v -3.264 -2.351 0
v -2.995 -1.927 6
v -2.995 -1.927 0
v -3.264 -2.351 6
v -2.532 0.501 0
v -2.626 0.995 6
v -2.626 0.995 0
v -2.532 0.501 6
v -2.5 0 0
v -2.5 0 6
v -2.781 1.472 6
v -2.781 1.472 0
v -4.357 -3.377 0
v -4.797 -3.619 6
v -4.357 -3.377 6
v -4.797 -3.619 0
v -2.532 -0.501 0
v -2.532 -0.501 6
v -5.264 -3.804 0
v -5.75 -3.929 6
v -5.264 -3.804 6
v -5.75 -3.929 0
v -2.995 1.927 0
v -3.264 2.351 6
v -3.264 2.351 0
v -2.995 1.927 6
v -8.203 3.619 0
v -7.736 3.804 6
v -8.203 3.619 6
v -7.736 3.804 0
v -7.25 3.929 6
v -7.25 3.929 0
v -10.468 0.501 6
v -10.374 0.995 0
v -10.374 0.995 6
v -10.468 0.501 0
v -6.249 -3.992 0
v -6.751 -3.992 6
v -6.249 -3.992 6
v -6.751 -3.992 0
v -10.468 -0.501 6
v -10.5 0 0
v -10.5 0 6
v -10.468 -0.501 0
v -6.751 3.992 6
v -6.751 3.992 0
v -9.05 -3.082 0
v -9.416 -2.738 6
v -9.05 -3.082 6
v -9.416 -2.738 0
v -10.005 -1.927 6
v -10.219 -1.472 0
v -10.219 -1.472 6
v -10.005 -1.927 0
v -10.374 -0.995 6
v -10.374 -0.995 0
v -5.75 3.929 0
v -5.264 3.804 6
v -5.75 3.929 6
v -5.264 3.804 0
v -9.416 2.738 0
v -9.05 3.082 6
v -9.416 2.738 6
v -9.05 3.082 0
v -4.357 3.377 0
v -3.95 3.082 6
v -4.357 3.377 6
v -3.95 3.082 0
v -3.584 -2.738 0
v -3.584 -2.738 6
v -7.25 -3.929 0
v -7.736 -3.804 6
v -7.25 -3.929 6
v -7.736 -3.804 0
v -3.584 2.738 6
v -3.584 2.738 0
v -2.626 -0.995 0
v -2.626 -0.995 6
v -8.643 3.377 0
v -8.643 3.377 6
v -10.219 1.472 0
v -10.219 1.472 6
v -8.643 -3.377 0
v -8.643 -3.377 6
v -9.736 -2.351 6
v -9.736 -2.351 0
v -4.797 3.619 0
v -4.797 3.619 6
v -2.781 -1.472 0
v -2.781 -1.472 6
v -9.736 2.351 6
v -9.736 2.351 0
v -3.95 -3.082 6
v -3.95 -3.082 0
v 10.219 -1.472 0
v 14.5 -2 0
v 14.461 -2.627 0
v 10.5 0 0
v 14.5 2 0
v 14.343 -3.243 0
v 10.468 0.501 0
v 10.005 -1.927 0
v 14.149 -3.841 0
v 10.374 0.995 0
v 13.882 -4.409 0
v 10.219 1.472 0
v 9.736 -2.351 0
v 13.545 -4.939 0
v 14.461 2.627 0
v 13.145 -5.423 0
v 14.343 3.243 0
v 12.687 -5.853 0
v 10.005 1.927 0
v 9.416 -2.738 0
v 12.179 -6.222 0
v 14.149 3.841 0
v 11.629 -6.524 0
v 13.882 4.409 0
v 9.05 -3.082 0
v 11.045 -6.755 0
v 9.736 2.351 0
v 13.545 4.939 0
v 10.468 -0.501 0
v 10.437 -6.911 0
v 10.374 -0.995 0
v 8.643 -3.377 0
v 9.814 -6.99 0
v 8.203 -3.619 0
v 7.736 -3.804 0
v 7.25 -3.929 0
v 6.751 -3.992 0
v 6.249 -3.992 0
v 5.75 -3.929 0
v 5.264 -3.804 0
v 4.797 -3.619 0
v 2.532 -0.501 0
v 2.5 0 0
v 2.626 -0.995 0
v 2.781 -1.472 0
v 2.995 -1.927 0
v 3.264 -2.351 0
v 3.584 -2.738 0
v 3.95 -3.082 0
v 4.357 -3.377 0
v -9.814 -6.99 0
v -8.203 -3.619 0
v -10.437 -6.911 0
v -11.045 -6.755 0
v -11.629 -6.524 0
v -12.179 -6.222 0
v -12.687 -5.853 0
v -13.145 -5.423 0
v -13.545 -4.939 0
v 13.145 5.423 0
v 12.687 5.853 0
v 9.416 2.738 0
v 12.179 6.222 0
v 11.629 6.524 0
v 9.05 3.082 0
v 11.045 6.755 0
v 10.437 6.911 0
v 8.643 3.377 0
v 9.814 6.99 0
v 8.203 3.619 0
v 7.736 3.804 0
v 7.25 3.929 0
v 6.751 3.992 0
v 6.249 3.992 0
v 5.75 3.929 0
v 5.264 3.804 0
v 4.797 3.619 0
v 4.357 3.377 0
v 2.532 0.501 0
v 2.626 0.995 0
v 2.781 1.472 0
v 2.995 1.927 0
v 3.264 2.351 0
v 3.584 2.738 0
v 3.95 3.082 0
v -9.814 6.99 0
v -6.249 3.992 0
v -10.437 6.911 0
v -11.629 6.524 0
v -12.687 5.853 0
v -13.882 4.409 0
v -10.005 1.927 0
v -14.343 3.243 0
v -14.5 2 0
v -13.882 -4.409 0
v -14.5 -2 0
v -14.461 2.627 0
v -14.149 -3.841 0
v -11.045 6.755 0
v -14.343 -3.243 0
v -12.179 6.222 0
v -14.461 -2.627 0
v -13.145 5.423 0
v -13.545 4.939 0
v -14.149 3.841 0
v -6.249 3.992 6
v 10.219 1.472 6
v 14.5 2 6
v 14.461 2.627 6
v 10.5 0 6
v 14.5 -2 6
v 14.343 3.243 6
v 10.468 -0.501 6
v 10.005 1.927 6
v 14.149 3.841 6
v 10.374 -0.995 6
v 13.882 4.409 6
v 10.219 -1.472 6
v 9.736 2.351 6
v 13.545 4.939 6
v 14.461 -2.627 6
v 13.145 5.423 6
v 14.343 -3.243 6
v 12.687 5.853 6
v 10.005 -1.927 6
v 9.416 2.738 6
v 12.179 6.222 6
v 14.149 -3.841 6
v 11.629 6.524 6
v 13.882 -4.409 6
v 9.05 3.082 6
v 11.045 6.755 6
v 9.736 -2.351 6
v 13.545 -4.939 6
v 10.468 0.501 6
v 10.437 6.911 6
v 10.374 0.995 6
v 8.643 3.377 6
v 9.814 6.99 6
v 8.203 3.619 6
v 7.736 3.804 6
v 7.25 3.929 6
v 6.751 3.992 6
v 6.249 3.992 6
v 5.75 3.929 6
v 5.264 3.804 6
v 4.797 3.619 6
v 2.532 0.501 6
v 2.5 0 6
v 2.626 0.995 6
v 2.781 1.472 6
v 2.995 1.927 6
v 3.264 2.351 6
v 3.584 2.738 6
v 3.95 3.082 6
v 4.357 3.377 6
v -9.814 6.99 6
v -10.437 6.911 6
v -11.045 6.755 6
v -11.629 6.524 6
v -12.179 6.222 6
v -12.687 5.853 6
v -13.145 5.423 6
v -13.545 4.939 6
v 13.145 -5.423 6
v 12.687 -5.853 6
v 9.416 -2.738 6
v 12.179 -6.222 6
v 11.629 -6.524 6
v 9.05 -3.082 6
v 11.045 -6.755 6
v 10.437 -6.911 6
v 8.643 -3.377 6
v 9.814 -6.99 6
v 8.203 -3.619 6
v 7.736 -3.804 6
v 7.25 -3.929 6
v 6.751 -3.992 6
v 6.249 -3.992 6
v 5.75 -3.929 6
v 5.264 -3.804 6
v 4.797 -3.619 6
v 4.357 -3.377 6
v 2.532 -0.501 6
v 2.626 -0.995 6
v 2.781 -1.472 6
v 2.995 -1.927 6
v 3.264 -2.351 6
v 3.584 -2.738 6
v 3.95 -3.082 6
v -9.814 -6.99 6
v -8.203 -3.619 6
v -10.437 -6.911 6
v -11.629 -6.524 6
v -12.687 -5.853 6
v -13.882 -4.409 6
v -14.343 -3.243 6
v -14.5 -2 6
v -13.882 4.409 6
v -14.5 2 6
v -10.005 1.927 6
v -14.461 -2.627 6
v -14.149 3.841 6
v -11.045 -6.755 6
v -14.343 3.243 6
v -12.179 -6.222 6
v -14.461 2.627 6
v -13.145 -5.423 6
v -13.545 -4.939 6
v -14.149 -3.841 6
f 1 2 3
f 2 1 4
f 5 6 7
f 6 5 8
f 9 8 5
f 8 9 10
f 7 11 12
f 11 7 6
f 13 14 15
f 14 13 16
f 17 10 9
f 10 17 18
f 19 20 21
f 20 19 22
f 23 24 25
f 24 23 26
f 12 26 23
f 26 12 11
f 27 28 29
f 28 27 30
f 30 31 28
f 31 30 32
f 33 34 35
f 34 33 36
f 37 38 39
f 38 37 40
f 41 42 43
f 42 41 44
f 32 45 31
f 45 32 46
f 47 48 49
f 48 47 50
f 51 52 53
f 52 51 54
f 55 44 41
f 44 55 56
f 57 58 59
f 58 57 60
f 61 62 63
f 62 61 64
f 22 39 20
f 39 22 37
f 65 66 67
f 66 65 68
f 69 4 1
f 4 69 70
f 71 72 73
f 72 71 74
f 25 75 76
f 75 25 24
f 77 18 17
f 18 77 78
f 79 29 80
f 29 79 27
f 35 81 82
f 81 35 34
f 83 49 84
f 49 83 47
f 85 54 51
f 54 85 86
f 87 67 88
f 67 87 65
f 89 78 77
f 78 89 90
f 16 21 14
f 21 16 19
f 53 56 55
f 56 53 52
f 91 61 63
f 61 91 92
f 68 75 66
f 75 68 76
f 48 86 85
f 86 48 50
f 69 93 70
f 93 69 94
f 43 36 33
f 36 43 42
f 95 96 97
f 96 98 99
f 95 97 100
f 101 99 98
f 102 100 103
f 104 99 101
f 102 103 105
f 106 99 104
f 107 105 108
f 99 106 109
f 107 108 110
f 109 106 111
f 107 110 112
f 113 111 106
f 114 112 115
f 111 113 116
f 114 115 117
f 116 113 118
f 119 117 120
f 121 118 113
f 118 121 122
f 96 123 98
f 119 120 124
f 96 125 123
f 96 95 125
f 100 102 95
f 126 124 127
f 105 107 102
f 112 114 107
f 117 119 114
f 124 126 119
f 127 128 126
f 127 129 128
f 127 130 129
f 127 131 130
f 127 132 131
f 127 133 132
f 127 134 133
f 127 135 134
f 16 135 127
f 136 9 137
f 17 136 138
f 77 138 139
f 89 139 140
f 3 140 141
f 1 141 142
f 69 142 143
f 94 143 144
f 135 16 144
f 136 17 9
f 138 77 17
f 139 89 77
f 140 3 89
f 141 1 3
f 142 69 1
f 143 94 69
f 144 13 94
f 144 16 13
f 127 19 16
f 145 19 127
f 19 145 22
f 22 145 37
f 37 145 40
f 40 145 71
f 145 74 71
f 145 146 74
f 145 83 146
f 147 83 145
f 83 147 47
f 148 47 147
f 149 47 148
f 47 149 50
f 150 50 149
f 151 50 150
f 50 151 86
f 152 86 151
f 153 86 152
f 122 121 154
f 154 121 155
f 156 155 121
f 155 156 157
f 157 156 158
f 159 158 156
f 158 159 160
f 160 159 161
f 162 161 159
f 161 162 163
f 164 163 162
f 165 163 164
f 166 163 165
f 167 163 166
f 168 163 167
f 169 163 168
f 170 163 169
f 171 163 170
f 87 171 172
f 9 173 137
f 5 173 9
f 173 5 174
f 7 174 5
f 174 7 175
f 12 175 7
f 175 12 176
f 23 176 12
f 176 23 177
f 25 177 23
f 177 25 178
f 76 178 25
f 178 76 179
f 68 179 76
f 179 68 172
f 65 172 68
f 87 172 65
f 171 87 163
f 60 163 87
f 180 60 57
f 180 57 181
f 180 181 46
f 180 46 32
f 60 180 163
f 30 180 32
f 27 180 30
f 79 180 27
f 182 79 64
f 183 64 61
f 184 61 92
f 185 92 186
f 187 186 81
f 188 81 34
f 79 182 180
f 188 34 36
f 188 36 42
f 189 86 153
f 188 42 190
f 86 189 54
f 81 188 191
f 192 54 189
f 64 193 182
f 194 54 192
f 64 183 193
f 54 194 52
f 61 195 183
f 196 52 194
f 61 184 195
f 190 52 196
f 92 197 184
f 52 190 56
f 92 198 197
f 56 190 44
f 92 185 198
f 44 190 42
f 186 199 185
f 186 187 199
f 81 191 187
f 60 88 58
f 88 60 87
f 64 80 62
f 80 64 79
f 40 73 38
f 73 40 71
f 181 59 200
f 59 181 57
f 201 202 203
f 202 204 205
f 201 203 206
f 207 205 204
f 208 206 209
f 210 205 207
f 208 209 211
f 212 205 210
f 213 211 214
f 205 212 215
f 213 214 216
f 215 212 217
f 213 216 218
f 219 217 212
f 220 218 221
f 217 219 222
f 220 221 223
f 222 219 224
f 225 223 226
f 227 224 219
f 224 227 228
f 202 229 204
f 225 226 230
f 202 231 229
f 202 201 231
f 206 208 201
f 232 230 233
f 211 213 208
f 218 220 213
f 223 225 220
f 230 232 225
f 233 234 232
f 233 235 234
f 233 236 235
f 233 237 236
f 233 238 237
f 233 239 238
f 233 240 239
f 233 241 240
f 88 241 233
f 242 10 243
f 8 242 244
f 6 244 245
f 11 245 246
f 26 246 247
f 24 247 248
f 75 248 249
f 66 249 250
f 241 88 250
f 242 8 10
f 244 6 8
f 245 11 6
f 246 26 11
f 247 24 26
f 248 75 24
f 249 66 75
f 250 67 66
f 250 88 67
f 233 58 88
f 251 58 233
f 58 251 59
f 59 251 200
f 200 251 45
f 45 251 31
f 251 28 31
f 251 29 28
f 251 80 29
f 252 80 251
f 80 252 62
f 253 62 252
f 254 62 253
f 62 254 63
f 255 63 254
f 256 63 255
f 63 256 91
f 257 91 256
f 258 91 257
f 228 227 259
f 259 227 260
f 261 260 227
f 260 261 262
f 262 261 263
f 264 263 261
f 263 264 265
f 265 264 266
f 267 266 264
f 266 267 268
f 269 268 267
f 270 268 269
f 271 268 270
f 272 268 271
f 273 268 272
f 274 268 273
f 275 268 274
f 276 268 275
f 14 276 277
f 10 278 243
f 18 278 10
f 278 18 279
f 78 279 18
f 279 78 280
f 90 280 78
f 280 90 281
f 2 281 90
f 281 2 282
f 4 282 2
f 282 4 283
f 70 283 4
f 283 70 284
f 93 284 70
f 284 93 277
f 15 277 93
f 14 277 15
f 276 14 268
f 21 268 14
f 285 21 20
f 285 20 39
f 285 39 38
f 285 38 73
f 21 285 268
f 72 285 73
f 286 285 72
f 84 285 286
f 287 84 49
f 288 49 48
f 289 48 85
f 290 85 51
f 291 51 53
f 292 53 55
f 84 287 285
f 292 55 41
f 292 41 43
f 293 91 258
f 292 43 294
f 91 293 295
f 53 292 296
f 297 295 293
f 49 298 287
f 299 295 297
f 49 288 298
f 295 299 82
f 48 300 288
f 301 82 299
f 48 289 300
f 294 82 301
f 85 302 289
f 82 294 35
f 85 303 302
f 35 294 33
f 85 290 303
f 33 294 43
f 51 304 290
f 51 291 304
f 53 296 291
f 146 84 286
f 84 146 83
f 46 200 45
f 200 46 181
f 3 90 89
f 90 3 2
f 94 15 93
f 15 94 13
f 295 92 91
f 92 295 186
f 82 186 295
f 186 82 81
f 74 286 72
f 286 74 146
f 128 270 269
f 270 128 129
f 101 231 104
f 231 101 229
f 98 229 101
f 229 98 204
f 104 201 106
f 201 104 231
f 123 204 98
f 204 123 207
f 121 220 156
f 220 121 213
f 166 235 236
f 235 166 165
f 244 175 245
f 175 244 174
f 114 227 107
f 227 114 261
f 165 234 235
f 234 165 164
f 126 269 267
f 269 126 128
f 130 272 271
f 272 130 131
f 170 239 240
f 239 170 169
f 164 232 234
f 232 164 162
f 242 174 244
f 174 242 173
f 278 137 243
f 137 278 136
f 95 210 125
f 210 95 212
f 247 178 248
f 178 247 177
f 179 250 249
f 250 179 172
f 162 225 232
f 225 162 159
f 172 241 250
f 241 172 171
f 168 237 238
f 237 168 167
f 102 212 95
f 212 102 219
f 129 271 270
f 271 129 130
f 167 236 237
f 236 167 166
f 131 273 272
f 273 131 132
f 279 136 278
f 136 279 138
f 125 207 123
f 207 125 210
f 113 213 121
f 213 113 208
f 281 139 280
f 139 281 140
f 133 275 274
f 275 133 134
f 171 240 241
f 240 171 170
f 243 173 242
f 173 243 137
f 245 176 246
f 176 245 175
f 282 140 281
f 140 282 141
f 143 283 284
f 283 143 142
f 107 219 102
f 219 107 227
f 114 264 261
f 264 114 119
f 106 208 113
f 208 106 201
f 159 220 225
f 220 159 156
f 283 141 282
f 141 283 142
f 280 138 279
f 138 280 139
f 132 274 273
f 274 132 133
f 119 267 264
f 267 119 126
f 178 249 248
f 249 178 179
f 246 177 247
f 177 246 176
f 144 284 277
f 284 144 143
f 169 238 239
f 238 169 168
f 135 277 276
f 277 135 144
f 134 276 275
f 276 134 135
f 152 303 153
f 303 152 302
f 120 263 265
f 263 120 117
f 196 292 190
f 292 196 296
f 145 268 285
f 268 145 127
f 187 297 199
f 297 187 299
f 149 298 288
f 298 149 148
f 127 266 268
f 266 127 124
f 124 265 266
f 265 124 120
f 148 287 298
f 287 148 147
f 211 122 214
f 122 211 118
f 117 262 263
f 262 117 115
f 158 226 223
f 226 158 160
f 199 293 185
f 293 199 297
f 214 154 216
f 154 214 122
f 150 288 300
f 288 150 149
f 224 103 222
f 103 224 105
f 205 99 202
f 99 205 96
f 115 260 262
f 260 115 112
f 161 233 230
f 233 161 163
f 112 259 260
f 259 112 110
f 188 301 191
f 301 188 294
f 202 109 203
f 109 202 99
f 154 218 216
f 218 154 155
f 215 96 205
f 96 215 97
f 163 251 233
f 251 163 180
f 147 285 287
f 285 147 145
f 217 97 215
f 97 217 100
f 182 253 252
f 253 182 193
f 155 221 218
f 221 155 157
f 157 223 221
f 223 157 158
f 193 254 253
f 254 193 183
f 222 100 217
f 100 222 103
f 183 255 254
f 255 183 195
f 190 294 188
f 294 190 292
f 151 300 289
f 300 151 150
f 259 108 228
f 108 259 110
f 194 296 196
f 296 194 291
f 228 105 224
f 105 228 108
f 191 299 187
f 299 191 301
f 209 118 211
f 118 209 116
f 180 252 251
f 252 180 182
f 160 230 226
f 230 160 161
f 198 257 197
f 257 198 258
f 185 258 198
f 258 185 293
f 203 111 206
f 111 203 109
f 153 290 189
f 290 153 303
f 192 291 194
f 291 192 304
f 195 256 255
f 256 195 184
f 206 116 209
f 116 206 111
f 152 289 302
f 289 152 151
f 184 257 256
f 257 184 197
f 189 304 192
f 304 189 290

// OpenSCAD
$fn = 50;


difference() {
	union() {
		hull() {
			translate(v = [-9.5000000000, 2.0000000000, 0]) {
				cylinder(h = 6, r = 5);
			}
			translate(v = [9.5000000000, 2.0000000000, 0]) {
				cylinder(h = 6, r = 5);
			}
			translate(v = [-9.5000000000, -2.0000000000, 0]) {
				cylinder(h = 6, r = 5);
			}
			translate(v = [9.5000000000, -2.0000000000, 0]) {
				cylinder(h = 6, r = 5);
			}
		}
	}
	union() {
		#translate(v = [-7.5000000000, 0.0000000000, -100.0000000000]) {
			cylinder(h = 200, r = 3.0000000000);
		}
		#translate(v = [-7.5000000000, 0.0000000000, -100.0000000000]) {
			cylinder(h = 200, r = 3.0000000000);
		}
		#translate(v = [7.5000000000, 0.0000000000, -100.0000000000]) {
			cylinder(h = 200, r = 3.0000000000);
		}
		#translate(v = [7.5000000000, 0.0000000000, -100.0000000000]) {
			cylinder(h = 200, r = 3.0000000000);
		}
		#translate(v = [-6.5000000000, 0, 0]) {
			cylinder(h = 6, r = 4.0000000000);
		}
		#translate(v = [6.5000000000, 0, 0]) {
			cylinder(h = 6, r = 4.0000000000);
		}
	}
}
